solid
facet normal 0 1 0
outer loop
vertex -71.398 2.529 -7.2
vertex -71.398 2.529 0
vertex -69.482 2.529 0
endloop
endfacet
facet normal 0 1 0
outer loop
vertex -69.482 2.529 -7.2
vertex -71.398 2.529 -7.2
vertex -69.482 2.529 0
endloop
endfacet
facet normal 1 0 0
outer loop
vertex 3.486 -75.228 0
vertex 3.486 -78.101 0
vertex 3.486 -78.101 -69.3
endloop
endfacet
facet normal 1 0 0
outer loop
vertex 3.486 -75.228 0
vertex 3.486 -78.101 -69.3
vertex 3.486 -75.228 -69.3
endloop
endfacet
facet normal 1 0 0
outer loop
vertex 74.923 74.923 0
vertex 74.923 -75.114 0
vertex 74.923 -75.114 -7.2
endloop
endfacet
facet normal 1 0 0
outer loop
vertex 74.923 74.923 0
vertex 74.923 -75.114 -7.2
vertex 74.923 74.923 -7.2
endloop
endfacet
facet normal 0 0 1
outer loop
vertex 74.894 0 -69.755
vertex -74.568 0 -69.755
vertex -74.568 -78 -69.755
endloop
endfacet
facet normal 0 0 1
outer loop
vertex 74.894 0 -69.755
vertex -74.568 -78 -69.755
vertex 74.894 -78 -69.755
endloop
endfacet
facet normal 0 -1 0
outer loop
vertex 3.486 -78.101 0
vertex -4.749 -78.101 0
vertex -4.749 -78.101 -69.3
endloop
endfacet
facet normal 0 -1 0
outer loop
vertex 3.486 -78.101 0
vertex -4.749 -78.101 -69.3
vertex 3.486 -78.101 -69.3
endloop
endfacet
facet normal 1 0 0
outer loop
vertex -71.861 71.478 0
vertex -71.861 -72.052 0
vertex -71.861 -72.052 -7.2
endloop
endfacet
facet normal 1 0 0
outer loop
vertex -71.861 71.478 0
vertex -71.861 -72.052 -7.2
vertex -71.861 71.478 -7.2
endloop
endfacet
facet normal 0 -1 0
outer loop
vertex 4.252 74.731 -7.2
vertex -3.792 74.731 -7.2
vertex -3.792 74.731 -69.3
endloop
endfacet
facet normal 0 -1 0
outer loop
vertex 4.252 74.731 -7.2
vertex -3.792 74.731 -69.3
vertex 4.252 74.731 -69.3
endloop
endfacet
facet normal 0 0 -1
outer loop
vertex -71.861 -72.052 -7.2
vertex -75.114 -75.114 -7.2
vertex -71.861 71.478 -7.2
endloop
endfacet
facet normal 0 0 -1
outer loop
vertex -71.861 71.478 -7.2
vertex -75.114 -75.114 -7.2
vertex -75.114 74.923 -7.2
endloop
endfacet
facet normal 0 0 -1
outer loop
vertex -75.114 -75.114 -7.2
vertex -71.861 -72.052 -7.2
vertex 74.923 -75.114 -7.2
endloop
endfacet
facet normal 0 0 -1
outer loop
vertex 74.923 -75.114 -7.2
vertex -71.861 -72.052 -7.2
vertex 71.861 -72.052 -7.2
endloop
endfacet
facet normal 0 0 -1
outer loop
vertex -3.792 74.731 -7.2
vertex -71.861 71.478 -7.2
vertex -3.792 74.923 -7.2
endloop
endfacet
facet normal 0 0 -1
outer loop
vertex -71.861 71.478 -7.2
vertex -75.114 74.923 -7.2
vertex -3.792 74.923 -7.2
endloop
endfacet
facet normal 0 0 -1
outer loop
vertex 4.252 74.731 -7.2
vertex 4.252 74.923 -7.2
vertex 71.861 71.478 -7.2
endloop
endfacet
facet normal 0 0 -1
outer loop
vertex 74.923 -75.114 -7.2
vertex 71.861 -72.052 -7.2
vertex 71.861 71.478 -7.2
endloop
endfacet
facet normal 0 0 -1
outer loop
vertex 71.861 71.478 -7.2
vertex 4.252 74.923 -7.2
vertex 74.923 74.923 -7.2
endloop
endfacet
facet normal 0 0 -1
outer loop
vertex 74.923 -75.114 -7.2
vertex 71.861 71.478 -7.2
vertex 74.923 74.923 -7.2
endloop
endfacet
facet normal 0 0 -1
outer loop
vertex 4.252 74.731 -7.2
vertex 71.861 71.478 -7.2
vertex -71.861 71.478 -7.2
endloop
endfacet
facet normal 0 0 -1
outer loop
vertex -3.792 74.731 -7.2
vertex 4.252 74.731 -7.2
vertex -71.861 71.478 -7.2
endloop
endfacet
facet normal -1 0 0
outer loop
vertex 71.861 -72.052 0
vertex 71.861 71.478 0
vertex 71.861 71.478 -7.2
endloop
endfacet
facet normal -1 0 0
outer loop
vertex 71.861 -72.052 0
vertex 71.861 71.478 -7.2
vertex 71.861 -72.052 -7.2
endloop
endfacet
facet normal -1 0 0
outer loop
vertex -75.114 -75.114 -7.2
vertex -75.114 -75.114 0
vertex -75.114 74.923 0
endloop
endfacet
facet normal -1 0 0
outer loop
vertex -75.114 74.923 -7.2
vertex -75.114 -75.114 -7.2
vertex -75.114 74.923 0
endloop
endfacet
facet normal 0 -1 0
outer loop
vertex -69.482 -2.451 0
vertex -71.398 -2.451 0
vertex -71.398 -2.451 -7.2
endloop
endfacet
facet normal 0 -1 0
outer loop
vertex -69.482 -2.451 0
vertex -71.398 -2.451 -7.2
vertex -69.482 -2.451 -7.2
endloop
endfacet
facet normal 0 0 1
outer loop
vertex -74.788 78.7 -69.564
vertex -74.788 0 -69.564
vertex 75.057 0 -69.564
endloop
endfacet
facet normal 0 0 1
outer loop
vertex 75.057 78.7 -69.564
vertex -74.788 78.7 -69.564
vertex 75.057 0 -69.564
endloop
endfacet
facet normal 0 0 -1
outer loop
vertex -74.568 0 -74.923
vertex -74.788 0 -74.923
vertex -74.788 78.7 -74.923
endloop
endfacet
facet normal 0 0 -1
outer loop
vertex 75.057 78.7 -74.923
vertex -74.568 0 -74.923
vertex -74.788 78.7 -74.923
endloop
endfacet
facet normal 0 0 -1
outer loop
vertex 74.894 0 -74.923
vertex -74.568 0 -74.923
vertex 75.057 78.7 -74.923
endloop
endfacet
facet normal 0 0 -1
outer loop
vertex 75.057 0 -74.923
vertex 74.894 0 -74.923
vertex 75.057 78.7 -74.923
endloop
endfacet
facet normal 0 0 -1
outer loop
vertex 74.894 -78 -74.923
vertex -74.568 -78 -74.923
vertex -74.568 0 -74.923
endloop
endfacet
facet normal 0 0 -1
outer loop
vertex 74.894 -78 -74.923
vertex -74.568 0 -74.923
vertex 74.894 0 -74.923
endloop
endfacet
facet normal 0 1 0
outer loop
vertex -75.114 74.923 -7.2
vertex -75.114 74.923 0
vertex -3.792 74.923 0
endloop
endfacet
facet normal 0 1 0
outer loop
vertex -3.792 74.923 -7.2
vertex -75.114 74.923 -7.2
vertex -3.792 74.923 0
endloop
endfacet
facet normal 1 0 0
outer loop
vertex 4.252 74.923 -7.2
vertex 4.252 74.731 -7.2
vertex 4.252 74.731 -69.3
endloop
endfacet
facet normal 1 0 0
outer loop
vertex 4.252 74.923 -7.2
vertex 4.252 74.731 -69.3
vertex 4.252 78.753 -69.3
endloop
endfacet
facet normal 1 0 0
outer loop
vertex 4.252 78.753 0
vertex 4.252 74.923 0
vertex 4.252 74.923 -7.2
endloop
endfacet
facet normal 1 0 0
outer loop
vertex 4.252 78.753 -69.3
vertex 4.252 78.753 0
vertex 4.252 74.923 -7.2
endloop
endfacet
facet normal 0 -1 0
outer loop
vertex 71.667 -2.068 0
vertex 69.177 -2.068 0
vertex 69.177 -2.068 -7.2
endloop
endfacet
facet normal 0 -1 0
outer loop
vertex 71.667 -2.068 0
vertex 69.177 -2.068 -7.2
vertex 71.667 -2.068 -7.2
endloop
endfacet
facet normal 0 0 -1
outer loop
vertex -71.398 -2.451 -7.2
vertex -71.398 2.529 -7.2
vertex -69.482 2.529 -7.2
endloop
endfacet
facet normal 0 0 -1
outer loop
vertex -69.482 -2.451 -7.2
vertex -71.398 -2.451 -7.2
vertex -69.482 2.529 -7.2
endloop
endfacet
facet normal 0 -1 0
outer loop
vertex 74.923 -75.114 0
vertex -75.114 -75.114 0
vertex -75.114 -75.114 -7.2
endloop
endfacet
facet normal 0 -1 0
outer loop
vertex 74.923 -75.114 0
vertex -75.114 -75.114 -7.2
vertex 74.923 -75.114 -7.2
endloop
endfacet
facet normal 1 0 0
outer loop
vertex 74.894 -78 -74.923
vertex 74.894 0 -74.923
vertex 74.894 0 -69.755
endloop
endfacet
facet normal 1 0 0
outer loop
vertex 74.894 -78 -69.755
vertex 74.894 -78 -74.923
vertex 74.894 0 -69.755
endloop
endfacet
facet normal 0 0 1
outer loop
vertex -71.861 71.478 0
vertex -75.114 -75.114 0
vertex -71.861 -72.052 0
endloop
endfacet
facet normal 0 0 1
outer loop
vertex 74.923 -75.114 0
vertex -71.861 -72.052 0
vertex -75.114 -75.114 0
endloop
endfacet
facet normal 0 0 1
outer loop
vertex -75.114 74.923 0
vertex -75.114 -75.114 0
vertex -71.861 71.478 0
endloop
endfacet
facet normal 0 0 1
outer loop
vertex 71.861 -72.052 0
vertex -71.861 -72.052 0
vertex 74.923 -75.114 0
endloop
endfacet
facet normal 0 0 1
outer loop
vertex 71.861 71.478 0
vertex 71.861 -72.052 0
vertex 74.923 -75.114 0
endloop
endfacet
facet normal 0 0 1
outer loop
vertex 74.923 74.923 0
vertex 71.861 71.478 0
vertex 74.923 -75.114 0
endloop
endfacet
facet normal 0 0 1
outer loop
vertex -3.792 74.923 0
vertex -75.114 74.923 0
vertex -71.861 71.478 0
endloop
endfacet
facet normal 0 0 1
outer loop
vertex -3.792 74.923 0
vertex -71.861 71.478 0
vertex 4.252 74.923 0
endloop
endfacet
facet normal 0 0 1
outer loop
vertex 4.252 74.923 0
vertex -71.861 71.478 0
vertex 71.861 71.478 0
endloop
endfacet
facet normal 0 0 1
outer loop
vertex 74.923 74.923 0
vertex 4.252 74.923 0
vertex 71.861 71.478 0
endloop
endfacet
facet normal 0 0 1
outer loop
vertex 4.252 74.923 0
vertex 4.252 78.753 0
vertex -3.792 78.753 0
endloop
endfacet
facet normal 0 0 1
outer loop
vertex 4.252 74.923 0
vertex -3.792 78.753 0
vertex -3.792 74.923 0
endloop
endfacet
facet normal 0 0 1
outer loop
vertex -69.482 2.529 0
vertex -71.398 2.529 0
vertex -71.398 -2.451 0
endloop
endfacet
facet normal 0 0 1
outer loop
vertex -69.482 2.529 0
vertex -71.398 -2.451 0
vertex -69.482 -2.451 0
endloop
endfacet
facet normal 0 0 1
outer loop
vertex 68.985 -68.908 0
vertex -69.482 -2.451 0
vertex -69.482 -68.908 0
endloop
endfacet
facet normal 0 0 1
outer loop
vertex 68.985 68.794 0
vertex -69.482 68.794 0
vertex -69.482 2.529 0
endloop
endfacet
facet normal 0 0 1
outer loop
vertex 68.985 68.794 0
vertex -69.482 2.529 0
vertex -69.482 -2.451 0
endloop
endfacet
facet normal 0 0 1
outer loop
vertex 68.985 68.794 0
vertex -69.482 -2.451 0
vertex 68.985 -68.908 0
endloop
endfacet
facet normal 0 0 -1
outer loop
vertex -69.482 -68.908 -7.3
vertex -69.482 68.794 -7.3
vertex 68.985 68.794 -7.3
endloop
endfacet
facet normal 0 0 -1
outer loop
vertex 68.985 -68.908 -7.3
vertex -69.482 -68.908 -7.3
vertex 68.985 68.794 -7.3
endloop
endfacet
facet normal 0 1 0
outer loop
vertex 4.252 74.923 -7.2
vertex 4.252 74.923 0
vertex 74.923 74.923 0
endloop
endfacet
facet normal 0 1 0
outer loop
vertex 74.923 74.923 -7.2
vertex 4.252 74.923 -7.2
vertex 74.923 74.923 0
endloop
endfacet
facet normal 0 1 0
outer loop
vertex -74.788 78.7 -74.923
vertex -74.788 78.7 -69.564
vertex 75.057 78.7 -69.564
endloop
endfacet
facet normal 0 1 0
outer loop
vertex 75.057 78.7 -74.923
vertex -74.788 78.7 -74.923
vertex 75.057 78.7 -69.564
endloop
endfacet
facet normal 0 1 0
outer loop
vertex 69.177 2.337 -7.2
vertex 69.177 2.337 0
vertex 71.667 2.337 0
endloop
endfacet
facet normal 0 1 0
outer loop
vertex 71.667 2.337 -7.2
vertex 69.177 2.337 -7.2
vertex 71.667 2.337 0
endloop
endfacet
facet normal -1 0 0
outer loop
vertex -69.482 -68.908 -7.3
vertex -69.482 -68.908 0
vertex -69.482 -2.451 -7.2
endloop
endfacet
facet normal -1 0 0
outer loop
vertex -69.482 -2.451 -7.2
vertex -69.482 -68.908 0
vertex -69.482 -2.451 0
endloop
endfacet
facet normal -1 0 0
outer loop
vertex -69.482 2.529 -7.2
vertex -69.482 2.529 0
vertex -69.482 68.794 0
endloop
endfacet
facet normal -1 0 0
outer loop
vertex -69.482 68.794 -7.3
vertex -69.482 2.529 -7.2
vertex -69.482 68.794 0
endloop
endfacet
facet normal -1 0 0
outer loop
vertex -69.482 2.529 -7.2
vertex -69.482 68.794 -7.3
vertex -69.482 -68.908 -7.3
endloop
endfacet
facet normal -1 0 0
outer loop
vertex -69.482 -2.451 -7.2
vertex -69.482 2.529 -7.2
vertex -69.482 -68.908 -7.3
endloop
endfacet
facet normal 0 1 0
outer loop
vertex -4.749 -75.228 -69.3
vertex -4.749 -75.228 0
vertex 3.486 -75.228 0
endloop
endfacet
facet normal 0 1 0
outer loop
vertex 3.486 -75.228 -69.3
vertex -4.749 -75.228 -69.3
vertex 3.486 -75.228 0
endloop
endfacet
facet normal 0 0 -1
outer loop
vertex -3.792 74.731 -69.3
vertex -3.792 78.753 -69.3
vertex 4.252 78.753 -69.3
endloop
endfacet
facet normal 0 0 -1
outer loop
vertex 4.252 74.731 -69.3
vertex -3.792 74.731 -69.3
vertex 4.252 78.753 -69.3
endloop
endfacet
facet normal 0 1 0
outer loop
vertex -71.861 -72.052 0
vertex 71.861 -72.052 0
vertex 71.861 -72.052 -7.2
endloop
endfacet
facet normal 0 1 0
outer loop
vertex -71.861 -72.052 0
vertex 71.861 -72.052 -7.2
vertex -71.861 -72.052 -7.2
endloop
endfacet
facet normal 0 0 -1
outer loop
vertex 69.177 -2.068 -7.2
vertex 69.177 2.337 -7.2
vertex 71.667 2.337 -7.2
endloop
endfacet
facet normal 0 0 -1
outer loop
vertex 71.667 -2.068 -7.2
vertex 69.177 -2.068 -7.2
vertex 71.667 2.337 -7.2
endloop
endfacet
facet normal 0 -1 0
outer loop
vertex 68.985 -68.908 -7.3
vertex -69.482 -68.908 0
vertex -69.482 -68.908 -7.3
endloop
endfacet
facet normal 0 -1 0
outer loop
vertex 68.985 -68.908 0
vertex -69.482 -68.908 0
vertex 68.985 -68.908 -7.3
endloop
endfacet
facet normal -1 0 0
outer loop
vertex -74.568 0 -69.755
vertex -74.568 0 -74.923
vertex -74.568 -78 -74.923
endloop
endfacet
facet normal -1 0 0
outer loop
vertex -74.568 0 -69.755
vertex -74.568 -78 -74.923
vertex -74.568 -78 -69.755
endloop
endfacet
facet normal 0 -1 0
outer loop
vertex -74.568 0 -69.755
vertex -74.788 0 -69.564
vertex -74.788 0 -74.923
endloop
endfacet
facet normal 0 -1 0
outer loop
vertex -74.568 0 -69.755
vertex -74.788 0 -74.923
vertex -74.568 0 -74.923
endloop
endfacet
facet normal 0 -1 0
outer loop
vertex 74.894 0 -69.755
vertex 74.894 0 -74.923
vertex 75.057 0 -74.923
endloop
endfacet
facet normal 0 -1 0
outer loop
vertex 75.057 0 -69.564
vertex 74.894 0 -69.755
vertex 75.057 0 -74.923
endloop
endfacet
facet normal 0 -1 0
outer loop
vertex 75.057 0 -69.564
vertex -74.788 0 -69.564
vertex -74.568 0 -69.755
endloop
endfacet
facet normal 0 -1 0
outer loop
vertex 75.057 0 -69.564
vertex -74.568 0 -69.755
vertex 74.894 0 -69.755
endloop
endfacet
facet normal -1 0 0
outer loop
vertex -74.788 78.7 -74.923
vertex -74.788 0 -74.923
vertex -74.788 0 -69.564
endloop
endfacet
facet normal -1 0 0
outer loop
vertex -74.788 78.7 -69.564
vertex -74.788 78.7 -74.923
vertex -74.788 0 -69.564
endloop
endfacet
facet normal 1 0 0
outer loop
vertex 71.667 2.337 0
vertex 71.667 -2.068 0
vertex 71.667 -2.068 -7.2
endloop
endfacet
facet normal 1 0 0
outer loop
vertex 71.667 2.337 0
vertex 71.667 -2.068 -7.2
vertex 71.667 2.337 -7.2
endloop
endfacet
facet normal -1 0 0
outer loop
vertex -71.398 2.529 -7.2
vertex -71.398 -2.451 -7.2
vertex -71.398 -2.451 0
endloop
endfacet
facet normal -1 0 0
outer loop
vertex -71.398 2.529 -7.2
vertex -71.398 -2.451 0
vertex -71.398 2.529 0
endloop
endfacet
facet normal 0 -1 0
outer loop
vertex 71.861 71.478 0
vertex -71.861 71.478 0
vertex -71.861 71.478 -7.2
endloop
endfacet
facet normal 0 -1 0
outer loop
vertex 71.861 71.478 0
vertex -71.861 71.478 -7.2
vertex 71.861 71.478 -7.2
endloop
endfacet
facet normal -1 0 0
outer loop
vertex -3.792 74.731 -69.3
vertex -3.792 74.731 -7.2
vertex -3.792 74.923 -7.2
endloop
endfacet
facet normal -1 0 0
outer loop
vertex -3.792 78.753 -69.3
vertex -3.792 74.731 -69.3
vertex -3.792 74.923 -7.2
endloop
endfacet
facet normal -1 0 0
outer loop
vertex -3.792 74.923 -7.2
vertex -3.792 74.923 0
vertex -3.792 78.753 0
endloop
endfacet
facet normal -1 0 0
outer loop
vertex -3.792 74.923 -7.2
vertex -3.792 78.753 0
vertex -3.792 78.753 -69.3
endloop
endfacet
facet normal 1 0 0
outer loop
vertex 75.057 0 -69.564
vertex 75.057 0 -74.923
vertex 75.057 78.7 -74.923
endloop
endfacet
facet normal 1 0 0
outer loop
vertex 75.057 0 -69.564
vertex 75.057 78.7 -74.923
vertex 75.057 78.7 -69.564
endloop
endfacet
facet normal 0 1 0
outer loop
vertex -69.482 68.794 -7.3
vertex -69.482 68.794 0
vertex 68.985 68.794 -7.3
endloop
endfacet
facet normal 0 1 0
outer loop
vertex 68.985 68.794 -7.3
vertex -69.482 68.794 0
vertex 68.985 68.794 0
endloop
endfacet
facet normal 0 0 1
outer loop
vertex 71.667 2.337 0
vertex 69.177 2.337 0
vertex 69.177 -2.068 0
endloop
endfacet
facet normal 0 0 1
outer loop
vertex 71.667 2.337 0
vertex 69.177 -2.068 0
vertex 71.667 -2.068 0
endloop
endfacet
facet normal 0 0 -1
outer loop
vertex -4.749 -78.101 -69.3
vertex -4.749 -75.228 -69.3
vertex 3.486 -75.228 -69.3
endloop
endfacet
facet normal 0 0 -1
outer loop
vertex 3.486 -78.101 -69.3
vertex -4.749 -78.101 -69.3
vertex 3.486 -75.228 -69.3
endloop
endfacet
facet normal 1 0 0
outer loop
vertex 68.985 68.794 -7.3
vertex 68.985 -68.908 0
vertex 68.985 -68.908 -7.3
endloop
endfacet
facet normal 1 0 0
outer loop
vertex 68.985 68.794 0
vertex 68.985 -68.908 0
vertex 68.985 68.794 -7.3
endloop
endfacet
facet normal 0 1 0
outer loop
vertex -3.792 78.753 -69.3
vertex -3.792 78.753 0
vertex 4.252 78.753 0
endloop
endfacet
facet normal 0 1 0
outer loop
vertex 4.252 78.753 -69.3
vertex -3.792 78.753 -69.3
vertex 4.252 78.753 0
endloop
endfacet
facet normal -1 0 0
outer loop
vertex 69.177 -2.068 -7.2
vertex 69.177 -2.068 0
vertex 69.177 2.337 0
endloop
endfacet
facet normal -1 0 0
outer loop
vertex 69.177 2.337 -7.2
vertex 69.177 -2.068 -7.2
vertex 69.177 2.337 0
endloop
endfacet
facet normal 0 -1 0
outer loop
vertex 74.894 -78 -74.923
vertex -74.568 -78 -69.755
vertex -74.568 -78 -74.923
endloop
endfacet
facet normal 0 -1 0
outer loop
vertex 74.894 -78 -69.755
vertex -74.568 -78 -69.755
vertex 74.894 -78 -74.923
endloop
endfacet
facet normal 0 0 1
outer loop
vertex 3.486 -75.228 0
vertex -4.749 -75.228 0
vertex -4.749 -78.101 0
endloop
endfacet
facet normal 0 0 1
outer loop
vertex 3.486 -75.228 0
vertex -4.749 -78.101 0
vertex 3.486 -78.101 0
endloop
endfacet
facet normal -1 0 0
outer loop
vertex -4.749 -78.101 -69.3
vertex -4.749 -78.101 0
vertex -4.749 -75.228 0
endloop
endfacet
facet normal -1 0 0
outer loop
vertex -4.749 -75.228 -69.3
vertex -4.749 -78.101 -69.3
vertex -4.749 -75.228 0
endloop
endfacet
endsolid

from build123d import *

# Parameters (mm, degrees)
F0_W      = 150.0364542007
F0_H      = 150.0364542007
F1_DEPTH  = 7.2
F2_W      = 138.4677812457
F2_H      = 137.7016976476
F3_DEPTH  = 7.3
F4_W      = 1.9151866436
F4_H      = 4.979477264
F5_DEPTH  = 7.2
F4_W_2    = 2.4897307158
F4_H_2    = 4.4049224816
F6_W      = 8.0437709112
F6_H      = 4.0218830109
F7_DEPTH  = 69.3
F6_W_2    = 8.2352899481
F6_H_2    = 2.8727799654
F8_W      = 149.8450785875
F8_H      = 5.3584426641
F9_DEPTH  = 78.7
F10_W     = 149.4623422623
F10_H     = 5.1670670509
F11_DEPTH = 78


with BuildPart() as f1:
    # F0 (on Top) → F1 (new body)
    with BuildSketch(Plane.XY):
        with Locations((-0.0956878066, -0.0956878066)):
            Rectangle(F0_W, F0_H)
        Polygon((-71.8605741858, -72.0519423485), (-71.8605741858, 71.47783041), (-2.5835367851, 71.47783041), (2.5835365523, 71.47783041), (71.8605741858, 71.47783041), (71.8605741858, -72.0519423485), (2.5835365523, -72.0519423485), (-2.5835367851, -72.0519423485), align=None, mode=Mode.SUBTRACT)
    extrude(amount=-F1_DEPTH)

    # F6 (on Top) → F7 (join)
    with BuildSketch(Plane.XY):
        with Locations((0.2303215442, 76.7419114709)):
            Rectangle(F6_W, F6_H)
    extrude(amount=-F7_DEPTH)


with BuildPart() as f3:
    # F2 (on Top) → F3 (new body)
    with BuildSketch(Plane.XY):
        with Locations((-0.2484731376, -0.0569559634)):
            Rectangle(F2_W, F2_H)
    extrude(amount=-F3_DEPTH)

    # F4 (on Top) → F5 (join)
    with BuildSketch(Plane.XY):
        with Locations((-70.4399570823, 0.0388030894)):
            Rectangle(F4_W, F4_H)
    extrude(amount=-F5_DEPTH)


with BuildPart() as f5:
    # F4 (on Top) → F5, piece 2 (new body)
    with BuildSketch(Plane.XY):
        with Locations((70.4218000174, 0.134562375)):
            Rectangle(F4_W_2, F4_H_2)
    extrude(amount=-F5_DEPTH)


with BuildPart() as f7:
    # F6 (on Top) → F7, piece 2 (new body)
    with BuildSketch(Plane.XY):
        with Locations((-0.631511095, -76.6642987728)):
            Rectangle(F6_W_2, F6_H_2)
    extrude(amount=-F7_DEPTH)


with BuildPart() as f9:
    # F8 (on Front) → F9 (new body)
    with BuildSketch(Plane.XZ):
        with Locations((0.1344159245, -72.2433179617)):
            Rectangle(F8_W, F8_H)
    extrude(amount=-F9_DEPTH)

    # F10 (on Front) → F11 (join)
    with BuildSketch(Plane.XZ):
        with Locations((0.1628920436, -72.3390057683)):
            Rectangle(F10_W, F10_H)
    extrude(amount=F11_DEPTH)


solid = Compound([f1.part, f3.part, f5.part, f7.part, f9.part])
